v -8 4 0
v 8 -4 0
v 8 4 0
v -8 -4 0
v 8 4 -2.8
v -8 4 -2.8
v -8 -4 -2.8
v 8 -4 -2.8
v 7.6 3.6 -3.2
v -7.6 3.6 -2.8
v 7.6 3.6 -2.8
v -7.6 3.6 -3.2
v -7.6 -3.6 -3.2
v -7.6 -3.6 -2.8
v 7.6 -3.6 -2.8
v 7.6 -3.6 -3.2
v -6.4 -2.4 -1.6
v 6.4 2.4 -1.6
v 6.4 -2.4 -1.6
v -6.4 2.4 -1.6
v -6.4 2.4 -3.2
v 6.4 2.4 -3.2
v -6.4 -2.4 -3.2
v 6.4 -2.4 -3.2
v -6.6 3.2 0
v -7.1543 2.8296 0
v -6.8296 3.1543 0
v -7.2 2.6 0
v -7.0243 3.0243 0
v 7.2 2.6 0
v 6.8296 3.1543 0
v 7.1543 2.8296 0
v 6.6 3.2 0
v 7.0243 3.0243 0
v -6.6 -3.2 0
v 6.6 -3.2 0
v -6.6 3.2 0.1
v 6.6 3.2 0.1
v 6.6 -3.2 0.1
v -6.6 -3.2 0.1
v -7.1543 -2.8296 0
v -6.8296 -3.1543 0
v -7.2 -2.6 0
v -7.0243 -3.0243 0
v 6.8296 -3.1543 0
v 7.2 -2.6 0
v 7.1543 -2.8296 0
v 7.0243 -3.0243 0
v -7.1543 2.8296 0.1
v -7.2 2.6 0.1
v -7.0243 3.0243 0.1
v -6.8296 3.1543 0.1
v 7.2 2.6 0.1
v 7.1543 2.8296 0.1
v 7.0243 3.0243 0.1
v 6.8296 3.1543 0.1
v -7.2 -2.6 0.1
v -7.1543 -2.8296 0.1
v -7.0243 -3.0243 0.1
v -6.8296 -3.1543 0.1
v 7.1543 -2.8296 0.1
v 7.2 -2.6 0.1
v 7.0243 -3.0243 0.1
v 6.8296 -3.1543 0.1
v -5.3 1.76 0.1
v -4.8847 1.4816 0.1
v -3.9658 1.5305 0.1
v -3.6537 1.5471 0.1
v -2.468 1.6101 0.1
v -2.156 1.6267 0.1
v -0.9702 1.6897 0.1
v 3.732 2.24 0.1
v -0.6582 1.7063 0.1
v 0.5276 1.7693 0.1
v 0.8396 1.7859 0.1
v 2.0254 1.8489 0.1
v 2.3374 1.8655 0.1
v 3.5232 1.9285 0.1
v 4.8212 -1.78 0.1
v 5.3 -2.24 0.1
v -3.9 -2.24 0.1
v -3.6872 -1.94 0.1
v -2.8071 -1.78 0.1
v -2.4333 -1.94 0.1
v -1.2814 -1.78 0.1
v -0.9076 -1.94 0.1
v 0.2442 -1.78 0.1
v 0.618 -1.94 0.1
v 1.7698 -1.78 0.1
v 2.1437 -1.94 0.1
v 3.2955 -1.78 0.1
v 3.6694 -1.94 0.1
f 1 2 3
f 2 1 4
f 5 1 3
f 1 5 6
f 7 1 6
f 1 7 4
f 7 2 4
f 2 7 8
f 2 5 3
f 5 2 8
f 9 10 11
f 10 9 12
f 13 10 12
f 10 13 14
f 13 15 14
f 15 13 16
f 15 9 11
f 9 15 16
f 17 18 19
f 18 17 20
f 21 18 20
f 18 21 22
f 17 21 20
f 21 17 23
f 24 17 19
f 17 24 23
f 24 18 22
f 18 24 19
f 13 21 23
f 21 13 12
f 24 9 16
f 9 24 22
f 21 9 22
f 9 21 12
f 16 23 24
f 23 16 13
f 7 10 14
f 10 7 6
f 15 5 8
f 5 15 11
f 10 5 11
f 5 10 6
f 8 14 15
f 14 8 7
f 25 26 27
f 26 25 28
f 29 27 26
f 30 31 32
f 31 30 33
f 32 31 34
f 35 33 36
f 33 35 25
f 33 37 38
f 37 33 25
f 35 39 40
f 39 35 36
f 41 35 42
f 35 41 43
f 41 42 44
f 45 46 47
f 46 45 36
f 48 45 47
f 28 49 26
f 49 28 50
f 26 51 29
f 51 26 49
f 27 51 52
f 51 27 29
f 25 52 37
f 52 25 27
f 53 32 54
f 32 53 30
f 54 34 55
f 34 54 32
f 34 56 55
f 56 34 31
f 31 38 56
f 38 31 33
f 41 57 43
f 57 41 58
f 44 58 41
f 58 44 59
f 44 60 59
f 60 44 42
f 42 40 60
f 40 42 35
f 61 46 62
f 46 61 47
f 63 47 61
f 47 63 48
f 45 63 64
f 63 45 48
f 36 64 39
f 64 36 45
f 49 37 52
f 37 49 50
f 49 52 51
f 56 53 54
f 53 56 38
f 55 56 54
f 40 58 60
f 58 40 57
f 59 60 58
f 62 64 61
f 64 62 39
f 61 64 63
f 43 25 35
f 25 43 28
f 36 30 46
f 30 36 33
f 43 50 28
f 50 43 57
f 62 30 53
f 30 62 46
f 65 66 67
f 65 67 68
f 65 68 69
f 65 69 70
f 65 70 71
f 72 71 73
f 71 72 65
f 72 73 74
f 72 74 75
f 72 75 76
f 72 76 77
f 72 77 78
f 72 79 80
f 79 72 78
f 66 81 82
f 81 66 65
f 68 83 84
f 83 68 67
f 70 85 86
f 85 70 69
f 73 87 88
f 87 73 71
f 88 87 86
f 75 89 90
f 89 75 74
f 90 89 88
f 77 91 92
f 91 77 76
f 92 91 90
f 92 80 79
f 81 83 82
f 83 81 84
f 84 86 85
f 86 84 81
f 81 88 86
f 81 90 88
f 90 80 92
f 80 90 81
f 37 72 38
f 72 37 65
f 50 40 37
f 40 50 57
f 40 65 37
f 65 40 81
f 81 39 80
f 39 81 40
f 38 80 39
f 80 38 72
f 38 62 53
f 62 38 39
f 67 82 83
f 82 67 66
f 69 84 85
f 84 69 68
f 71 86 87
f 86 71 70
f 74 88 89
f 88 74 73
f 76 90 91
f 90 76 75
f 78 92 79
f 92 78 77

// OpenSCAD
// file: ../p/box5.scad
use <../lib.scad>
function ldraw_lib__box5() = [
// 0 Box with 5 Faces and All Edges
// 0 Name: box5.dat
// 0 Author: James Jessiman
// 0 !LDRAW_ORG Primitive UPDATE 2012-01
// 0 !LICENSE Licensed under CC BY 4.0 : see CAreadme.txt
// 
// 0 BFC CERTIFY CCW
  [0,"BFC","CERTIFY"],
  [0,"BFC","CCW"],
// 
// 0 !HISTORY 2002-04-03 [sbliss] Modified for BFC compliance
// 0 !HISTORY 2002-04-25 [PTadmin] Official Update 2002-02
// 0 !HISTORY 2007-06-24 [PTadmin] Header formatted for Contributor Agreement
// 0 !HISTORY 2008-07-01 [PTadmin] Official Update 2008-01
// 0 !HISTORY 2012-02-16 [Philo] Changed to CCW
// 0 !HISTORY 2012-03-30 [PTadmin] Official Update 2012-01
// 
// 
// 2 24 1 1 1 -1 1 1
  [2,24,1,1,1,-1,1,1],
// 2 24 -1 1 1 -1 1 -1
  [2,24,-1,1,1,-1,1,-1],
// 2 24 -1 1 -1 1 1 -1
  [2,24,-1,1,-1,1,1,-1],
// 2 24 1 1 -1 1 1 1
  [2,24,1,1,-1,1,1,1],
// 2 24 1 0 1 -1 0 1
  [2,24,1,0,1,-1,0,1],
// 2 24 -1 0 1 -1 0 -1
  [2,24,-1,0,1,-1,0,-1],
// 2 24 -1 0 -1 1 0 -1
  [2,24,-1,0,-1,1,0,-1],
// 2 24 1 0 -1 1 0 1
  [2,24,1,0,-1,1,0,1],
// 2 24 1 0 1 1 1 1
  [2,24,1,0,1,1,1,1],
// 2 24 -1 0 1 -1 1 1
  [2,24,-1,0,1,-1,1,1],
// 2 24 1 0 -1 1 1 -1
  [2,24,1,0,-1,1,1,-1],
// 2 24 -1 0 -1 -1 1 -1
  [2,24,-1,0,-1,-1,1,-1],
// 4 16 -1 1 1 1 1 1 1 1 -1 -1 1 -1
  [4,16,-1,1,1,1,1,1,1,1,-1,-1,1,-1],
// 4 16 -1 1 1 -1 0 1 1 0 1 1 1 1
  [4,16,-1,1,1,-1,0,1,1,0,1,1,1,1],
// 4 16 -1 1 -1 -1 0 -1 -1 0 1 -1 1 1
  [4,16,-1,1,-1,-1,0,-1,-1,0,1,-1,1,1],
// 4 16 1 1 -1 1 0 -1 -1 0 -1 -1 1 -1
  [4,16,1,1,-1,1,0,-1,-1,0,-1,-1,1,-1],
// 4 16 1 1 1 1 0 1 1 0 -1 1 1 -1
  [4,16,1,1,1,1,0,1,1,0,-1,1,1,-1],
];
module ldraw_lib__box5(step=0, col=false, unit=2/5, alt=false, line=0.2, solid=!$preview)
    makepoly(ldraw_lib__box5(), step=step, col=col, unit=unit, alt=alt, line=line, solid=solid);
ldraw_lib__box5(line=0.2);
// file: ../p/box4.scad
use <../lib.scad>
function ldraw_lib__box4() = [
// 0 Box with 4 Faces (2 Parallel Pairs) and All Edges
// 0 Name: box4.dat
// 0 Author: James Jessiman
// 0 !LDRAW_ORG Primitive UPDATE 2012-01
// 0 !LICENSE Licensed under CC BY 4.0 : see CAreadme.txt
// 
// 0 BFC CERTIFY CCW
  [0,"BFC","CERTIFY"],
  [0,"BFC","CCW"],
// 
// 0 !HISTORY 2002-04-03 [sbliss] Modified for BFC compliance
// 0 !HISTORY 2002-04-25 [PTadmin] Official Update 2002-02
// 0 !HISTORY 2007-06-24 [PTadmin] Header formatted for Contributor Agreement
// 0 !HISTORY 2008-07-01 [PTadmin] Official Update 2008-01
// 0 !HISTORY 2012-02-16 [Philo] Changed to CCW
// 0 !HISTORY 2012-03-30 [PTadmin] Official Update 2012-01
// 
// 
// 2 24 1 1 1 -1 1 1
  [2,24,1,1,1,-1,1,1],
// 2 24 -1 1 1 -1 1 -1
  [2,24,-1,1,1,-1,1,-1],
// 2 24 -1 1 -1 1 1 -1
  [2,24,-1,1,-1,1,1,-1],
// 2 24 1 1 -1 1 1 1
  [2,24,1,1,-1,1,1,1],
// 2 24 1 0 1 -1 0 1
  [2,24,1,0,1,-1,0,1],
// 2 24 -1 0 1 -1 0 -1
  [2,24,-1,0,1,-1,0,-1],
// 2 24 -1 0 -1 1 0 -1
  [2,24,-1,0,-1,1,0,-1],
// 2 24 1 0 -1 1 0 1
  [2,24,1,0,-1,1,0,1],
// 2 24 1 0 1 1 1 1
  [2,24,1,0,1,1,1,1],
// 2 24 -1 0 1 -1 1 1
  [2,24,-1,0,1,-1,1,1],
// 2 24 1 0 -1 1 1 -1
  [2,24,1,0,-1,1,1,-1],
// 2 24 -1 0 -1 -1 1 -1
  [2,24,-1,0,-1,-1,1,-1],
// 4 16 -1 1 1 -1 0 1 1 0 1 1 1 1
  [4,16,-1,1,1,-1,0,1,1,0,1,1,1,1],
// 4 16 -1 1 -1 -1 0 -1 -1 0 1 -1 1 1
  [4,16,-1,1,-1,-1,0,-1,-1,0,1,-1,1,1],
// 4 16 1 1 -1 1 0 -1 -1 0 -1 -1 1 -1
  [4,16,1,1,-1,1,0,-1,-1,0,-1,-1,1,-1],
// 4 16 1 1 1 1 0 1 1 0 -1 1 1 -1
  [4,16,1,1,1,1,0,1,1,0,-1,1,1,-1],
];
module ldraw_lib__box4(step=0, col=false, unit=2/5, alt=false, line=0.2, solid=!$preview)
    makepoly(ldraw_lib__box4(), step=step, col=col, unit=unit, alt=alt, line=line, solid=solid);
ldraw_lib__box4(line=0.2);
// file: ../p/box3u12.scad
use <../lib.scad>
function ldraw_lib__box3u12() = [
// 0 Box with 3 Parallel Faces without Any Edges
// 0 Name: box3u12.dat
// 0 Author: J.C. Tchang [tchang]
// 0 !LDRAW_ORG Primitive UPDATE 2014-02
// 0 !LICENSE Licensed under CC BY 4.0 : see CAreadme.txt
// 
// 0 BFC CERTIFY CCW
  [0,"BFC","CERTIFY"],
  [0,"BFC","CCW"],
// 
// 0 !HISTORY 2014-12-23 [PTadmin] Official Update 2014-02
// 
// 
// 4 16 -1 1 1 1 1 1 1 1 -1 -1 1 -1
  [4,16,-1,1,1,1,1,1,1,1,-1,-1,1,-1],
// 4 16 -1 1 1 -1 0 1 1 0 1 1 1 1
  [4,16,-1,1,1,-1,0,1,1,0,1,1,1,1],
// 4 16 1 1 -1 1 0 -1 -1 0 -1 -1 1 -1
  [4,16,1,1,-1,1,0,-1,-1,0,-1,-1,1,-1],
];
module ldraw_lib__box3u12(step=0, col=false, unit=2/5, alt=false, line=0.2, solid=!$preview)
    makepoly(ldraw_lib__box3u12(), step=step, col=col, unit=unit, alt=alt, line=line, solid=solid);
ldraw_lib__box3u12(line=0.2);
// file: ../p/1-4cyli.scad
use <../lib.scad>
function ldraw_lib__1_4cyli() = [
// 0 Cylinder 0.25
// 0 Name: 1-4cyli.dat
// 0 Author: James Jessiman
// 0 !LDRAW_ORG Primitive UPDATE 2012-01
// 0 !LICENSE Licensed under CC BY 4.0 : see CAreadme.txt
// 
// 0 BFC CERTIFY CCW
  [0,"BFC","CERTIFY"],
  [0,"BFC","CCW"],
// 
// 0 !HISTORY 2002-03-23 [sbliss] Added BFC statement.
// 0 !HISTORY 2002-04-25 [PTadmin] Official Update 2002-02
// 0 !HISTORY 2007-06-22 [PTadmin] Header formatted for Contributor Agreement
// 0 !HISTORY 2008-07-01 [PTadmin] Official Update 2008-01
// 0 !HISTORY 2012-02-16 [Philo] Changed to CCW
// 0 !HISTORY 2012-03-30 [PTadmin] Official Update 2012-01
// 
// 
// 4 16 1 1 0 0.9239 1 0.3827 0.9239 0 0.3827 1 0 0
  [4,16,1,1,0,0.9239,1,0.3827,0.9239,0,0.3827,1,0,0],
// 5 24 1 0 0 1 1 0 0.9239 0 0.3827 1 0 -1
  [5,24,1,0,0,1,1,0,0.9239,0,0.3827,1,0,-1],
// 4 16 0.9239 1 0.3827 0.7071 1 0.7071 0.7071 0 0.7071 0.9239 0 0.3827
  [4,16,0.9239,1,0.3827,0.7071,1,0.7071,0.7071,0,0.7071,0.9239,0,0.3827],
// 5 24 0.9239 0 0.3827 0.9239 1 0.3827 0.7071 0 0.7071 1 0 0
  [5,24,0.9239,0,0.3827,0.9239,1,0.3827,0.7071,0,0.7071,1,0,0],
// 4 16 0.7071 1 0.7071 0.3827 1 0.9239 0.3827 0 0.9239 0.7071 0 0.7071
  [4,16,0.7071,1,0.7071,0.3827,1,0.9239,0.3827,0,0.9239,0.7071,0,0.7071],
// 5 24 0.7071 0 0.7071 0.7071 1 0.7071 0.3827 0 0.9239 0.9239 0 0.3827
  [5,24,0.7071,0,0.7071,0.7071,1,0.7071,0.3827,0,0.9239,0.9239,0,0.3827],
// 4 16 0.3827 1 0.9239 0 1 1 0 0 1 0.3827 0 0.9239
  [4,16,0.3827,1,0.9239,0,1,1,0,0,1,0.3827,0,0.9239],
// 5 24 0.3827 0 0.9239 0.3827 1 0.9239 0 0 1 0.7071 0 0.7071
  [5,24,0.3827,0,0.9239,0.3827,1,0.9239,0,0,1,0.7071,0,0.7071],
// 5 24 0 0 1 0 1 1 0.3827 0 0.9239 -1 0 1
  [5,24,0,0,1,0,1,1,0.3827,0,0.9239,-1,0,1],
];
module ldraw_lib__1_4cyli(step=0, col=false, unit=2/5, alt=false, line=0.2, solid=!$preview)
    makepoly(ldraw_lib__1_4cyli(), step=step, col=col, unit=unit, alt=alt, line=line, solid=solid);
ldraw_lib__1_4cyli(line=0.2);
// file: ../p/1-4chrd.scad
use <../lib.scad>
function ldraw_lib__1_4chrd() = [
// 0 Chord 0.25
// 0 Name: 1-4chrd.dat
// 0 Author: Max Martin Richter [MMR1988]
// 0 !LDRAW_ORG Primitive UPDATE 2023-05
// 0 !LICENSE Licensed under CC BY 4.0 : see CAreadme.txt
// 
// 0 BFC CERTIFY CCW
  [0,"BFC","CERTIFY"],
  [0,"BFC","CCW"],
// 
// 0 !HISTORY 2004-04-22 [PTadmin] Official Update 2004-02
// 0 !HISTORY 2007-10-09 [PTadmin] Header formatted for Contributor Agreement
// 0 !HISTORY 2008-07-01 [PTadmin] Official Update 2008-01
// 0 !HISTORY 2012-08-02 [MMR1988] Re-creation with PrimGen2 and Rectifier
// 0 !HISTORY 2012-08-09 [PTadmin] Official Update 2012-02
// 0 !HISTORY 2023-10-27 [OrionP] Change author to MMR1988 from hafhead
// 0 !HISTORY 2023-10-31 [OrionP] Official Update 2023-05
// 
// 4 16 0.9239 0 0.3827 0.3827 0 0.9239 0 0 1 1 0 0
  [4,16,0.9239,0,0.3827,0.3827,0,0.9239,0,0,1,1,0,0],
// 3 16 0.7071 0 0.7071 0.3827 0 0.9239 0.9239 0 0.3827
  [3,16,0.7071,0,0.7071,0.3827,0,0.9239,0.9239,0,0.3827],
];
module ldraw_lib__1_4chrd(step=0, col=false, unit=2/5, alt=false, line=0.2, solid=!$preview)
    makepoly(ldraw_lib__1_4chrd(), step=step, col=col, unit=unit, alt=alt, line=line, solid=solid);
ldraw_lib__1_4chrd(line=0.2);
// file: s/3069bs01.scad
use <../../lib.scad>
use <../../p/box4.scad>
use <../../p/box5.scad>
function ldraw_lib__s__3069bs01() = [
// 0 ~Tile  1 x  2 with Groove without Top Face
// 0 Name: s\3069bs01.dat
// 0 Author: Santeri Piippo [arezey]
// 0 !LDRAW_ORG Subpart UPDATE 2010-02
// 0 !LICENSE Licensed under CC BY 4.0 : see CAreadme.txt
// 
// 0 BFC CERTIFY CCW
  [0,"BFC","CERTIFY"],
  [0,"BFC","CCW"],
// 
// 0 !HISTORY 2010-07-05 [PTadmin] Official Update 2010-02
// 
// 
// 1 16 0 0 0 20 0 0 0 7 0 0 0 10 box4.dat
  [1,16,0,0,0,20,0,0,0,7,0,0,0,10, ldraw_lib__box4()],
// 1 16 0 7 0 19 0 0 0 1 0 0 0 9 box4.dat
  [1,16,0,7,0,19,0,0,0,1,0,0,0,9, ldraw_lib__box4()],
// 0 BFC INVERTNEXT
  [0,"BFC","INVERTNEXT"],
// 1 16 0 8 0 16 0 0 0 -4 0 0 0 6 box5.dat
  [1,16,0,8,0,16,0,0,0,-4,0,0,0,6, ldraw_lib__box5()],
// 4 16 -19 8 9 -16 8 6 -16 8 -6 -19 8 -9
  [4,16,-19,8,9,-16,8,6,-16,8,-6,-19,8,-9],
// 4 16 19 8 -9 16 8 -6 16 8 6 19 8 9
  [4,16,19,8,-9,16,8,-6,16,8,6,19,8,9],
// 4 16 19 8 9 16 8 6 -16 8 6 -19 8 9
  [4,16,19,8,9,16,8,6,-16,8,6,-19,8,9],
// 4 16 -19 8 -9 -16 8 -6 16 8 -6 19 8 -9
  [4,16,-19,8,-9,-16,8,-6,16,8,-6,19,8,-9],
// 4 16 -20 7 10 -19 7 9 -19 7 -9 -20 7 -10
  [4,16,-20,7,10,-19,7,9,-19,7,-9,-20,7,-10],
// 4 16 20 7 -10 19 7 -9 19 7 9 20 7 10
  [4,16,20,7,-10,19,7,-9,19,7,9,20,7,10],
// 4 16 20 7 10 19 7 9 -19 7 9 -20 7 10
  [4,16,20,7,10,19,7,9,-19,7,9,-20,7,10],
// 4 16 -20 7 -10 -19 7 -9 19 7 -9 20 7 -10
  [4,16,-20,7,-10,-19,7,-9,19,7,-9,20,7,-10],
// 0 //
];
module ldraw_lib__s__3069bs01(step=0, col=false, unit=2/5, alt=false, line=0.2, solid=!$preview)
    makepoly(ldraw_lib__s__3069bs01(), step=step, col=col, unit=unit, alt=alt, line=line, solid=solid);
ldraw_lib__s__3069bs01(line=0.2);
// file: 3069b.scad
use <../lib.scad>
use <s/3069bs01.scad>
function ldraw_lib__3069b() = [
// 0 Tile  1 x  2 with Groove
// 0 Name: 3069b.dat
// 0 Author: Santeri Piippo [arezey]
// 0 !LDRAW_ORG Part UPDATE 2010-02
// 0 !LICENSE Licensed under CC BY 4.0 : see CAreadme.txt
// 
// 0 BFC CERTIFY CCW
  [0,"BFC","CERTIFY"],
  [0,"BFC","CCW"],
// 
// 0 !HISTORY 2010-07-05 [PTadmin] Official Update 2010-02
// 
// 
// 4 16 20 0 -10 20 0 10 -20 0 10 -20 0 -10
  [4,16,20,0,-10,20,0,10,-20,0,10,-20,0,-10],
// 1 16 0 0 0 1 0 0 0 1 0 0 0 1 s\3069bs01.dat
  [1,16,0,0,0,1,0,0,0,1,0,0,0,1, ldraw_lib__s__3069bs01()],
// 0 //
];
module ldraw_lib__3069b(step=0, col=false, unit=2/5, alt=false, line=0.2, solid=!$preview)
    makepoly(ldraw_lib__3069b(), step=step, col=col, unit=unit, alt=alt, line=line, solid=solid);
ldraw_lib__3069b(line=0.2);
// main file
use <../lib.scad>
use <3069b.scad>
use <6142271m.scad>
function ldraw_lib__3069bd1j() = [
// 0 Tile  1 x  2 with Black Air Vents on White Background Right Sticker
// 0 Name: 3069bd1j.dat
// 0 Author: Vincent Messenet [Cheenzo]
// 0 !LDRAW_ORG Shortcut UPDATE 2025-03
// 0 !LICENSE Licensed under CC BY 4.0 : see CAreadme.txt
// 
// 0 BFC CERTIFY CCW
  [0,"BFC","CERTIFY"],
  [0,"BFC","CCW"],
// 
// 0 !CATEGORY Sticker Shortcut
// 0 !KEYWORDS Audi R8 LMS ultra, Bricklink 3069pb0971R, Set 75873
// 
// 0 !HISTORY 2025-03-30 [OrionP] Official Update 2025-03
// 
// 1 16 0 0 0 1 0 0 0 1 0 0 0 1 3069b.dat
  [1,16,0,0,0,1,0,0,0,1,0,0,0,1, ldraw_lib__3069b()],
// 1 16 0 0 0 1 0 0 0 1 0 0 0 1 6142271m.dat
  [1,16,0,0,0,1,0,0,0,1,0,0,0,1, ldraw_lib__6142271m()],
];
module ldraw_lib__3069bd1j(step=0, col=false, unit=2/5, alt=false, line=0.2, solid=!$preview)
    makepoly(ldraw_lib__3069bd1j(), step=step, col=col, unit=unit, alt=alt, line=line, solid=solid);
ldraw_lib__3069bd1j(line=0.2);
